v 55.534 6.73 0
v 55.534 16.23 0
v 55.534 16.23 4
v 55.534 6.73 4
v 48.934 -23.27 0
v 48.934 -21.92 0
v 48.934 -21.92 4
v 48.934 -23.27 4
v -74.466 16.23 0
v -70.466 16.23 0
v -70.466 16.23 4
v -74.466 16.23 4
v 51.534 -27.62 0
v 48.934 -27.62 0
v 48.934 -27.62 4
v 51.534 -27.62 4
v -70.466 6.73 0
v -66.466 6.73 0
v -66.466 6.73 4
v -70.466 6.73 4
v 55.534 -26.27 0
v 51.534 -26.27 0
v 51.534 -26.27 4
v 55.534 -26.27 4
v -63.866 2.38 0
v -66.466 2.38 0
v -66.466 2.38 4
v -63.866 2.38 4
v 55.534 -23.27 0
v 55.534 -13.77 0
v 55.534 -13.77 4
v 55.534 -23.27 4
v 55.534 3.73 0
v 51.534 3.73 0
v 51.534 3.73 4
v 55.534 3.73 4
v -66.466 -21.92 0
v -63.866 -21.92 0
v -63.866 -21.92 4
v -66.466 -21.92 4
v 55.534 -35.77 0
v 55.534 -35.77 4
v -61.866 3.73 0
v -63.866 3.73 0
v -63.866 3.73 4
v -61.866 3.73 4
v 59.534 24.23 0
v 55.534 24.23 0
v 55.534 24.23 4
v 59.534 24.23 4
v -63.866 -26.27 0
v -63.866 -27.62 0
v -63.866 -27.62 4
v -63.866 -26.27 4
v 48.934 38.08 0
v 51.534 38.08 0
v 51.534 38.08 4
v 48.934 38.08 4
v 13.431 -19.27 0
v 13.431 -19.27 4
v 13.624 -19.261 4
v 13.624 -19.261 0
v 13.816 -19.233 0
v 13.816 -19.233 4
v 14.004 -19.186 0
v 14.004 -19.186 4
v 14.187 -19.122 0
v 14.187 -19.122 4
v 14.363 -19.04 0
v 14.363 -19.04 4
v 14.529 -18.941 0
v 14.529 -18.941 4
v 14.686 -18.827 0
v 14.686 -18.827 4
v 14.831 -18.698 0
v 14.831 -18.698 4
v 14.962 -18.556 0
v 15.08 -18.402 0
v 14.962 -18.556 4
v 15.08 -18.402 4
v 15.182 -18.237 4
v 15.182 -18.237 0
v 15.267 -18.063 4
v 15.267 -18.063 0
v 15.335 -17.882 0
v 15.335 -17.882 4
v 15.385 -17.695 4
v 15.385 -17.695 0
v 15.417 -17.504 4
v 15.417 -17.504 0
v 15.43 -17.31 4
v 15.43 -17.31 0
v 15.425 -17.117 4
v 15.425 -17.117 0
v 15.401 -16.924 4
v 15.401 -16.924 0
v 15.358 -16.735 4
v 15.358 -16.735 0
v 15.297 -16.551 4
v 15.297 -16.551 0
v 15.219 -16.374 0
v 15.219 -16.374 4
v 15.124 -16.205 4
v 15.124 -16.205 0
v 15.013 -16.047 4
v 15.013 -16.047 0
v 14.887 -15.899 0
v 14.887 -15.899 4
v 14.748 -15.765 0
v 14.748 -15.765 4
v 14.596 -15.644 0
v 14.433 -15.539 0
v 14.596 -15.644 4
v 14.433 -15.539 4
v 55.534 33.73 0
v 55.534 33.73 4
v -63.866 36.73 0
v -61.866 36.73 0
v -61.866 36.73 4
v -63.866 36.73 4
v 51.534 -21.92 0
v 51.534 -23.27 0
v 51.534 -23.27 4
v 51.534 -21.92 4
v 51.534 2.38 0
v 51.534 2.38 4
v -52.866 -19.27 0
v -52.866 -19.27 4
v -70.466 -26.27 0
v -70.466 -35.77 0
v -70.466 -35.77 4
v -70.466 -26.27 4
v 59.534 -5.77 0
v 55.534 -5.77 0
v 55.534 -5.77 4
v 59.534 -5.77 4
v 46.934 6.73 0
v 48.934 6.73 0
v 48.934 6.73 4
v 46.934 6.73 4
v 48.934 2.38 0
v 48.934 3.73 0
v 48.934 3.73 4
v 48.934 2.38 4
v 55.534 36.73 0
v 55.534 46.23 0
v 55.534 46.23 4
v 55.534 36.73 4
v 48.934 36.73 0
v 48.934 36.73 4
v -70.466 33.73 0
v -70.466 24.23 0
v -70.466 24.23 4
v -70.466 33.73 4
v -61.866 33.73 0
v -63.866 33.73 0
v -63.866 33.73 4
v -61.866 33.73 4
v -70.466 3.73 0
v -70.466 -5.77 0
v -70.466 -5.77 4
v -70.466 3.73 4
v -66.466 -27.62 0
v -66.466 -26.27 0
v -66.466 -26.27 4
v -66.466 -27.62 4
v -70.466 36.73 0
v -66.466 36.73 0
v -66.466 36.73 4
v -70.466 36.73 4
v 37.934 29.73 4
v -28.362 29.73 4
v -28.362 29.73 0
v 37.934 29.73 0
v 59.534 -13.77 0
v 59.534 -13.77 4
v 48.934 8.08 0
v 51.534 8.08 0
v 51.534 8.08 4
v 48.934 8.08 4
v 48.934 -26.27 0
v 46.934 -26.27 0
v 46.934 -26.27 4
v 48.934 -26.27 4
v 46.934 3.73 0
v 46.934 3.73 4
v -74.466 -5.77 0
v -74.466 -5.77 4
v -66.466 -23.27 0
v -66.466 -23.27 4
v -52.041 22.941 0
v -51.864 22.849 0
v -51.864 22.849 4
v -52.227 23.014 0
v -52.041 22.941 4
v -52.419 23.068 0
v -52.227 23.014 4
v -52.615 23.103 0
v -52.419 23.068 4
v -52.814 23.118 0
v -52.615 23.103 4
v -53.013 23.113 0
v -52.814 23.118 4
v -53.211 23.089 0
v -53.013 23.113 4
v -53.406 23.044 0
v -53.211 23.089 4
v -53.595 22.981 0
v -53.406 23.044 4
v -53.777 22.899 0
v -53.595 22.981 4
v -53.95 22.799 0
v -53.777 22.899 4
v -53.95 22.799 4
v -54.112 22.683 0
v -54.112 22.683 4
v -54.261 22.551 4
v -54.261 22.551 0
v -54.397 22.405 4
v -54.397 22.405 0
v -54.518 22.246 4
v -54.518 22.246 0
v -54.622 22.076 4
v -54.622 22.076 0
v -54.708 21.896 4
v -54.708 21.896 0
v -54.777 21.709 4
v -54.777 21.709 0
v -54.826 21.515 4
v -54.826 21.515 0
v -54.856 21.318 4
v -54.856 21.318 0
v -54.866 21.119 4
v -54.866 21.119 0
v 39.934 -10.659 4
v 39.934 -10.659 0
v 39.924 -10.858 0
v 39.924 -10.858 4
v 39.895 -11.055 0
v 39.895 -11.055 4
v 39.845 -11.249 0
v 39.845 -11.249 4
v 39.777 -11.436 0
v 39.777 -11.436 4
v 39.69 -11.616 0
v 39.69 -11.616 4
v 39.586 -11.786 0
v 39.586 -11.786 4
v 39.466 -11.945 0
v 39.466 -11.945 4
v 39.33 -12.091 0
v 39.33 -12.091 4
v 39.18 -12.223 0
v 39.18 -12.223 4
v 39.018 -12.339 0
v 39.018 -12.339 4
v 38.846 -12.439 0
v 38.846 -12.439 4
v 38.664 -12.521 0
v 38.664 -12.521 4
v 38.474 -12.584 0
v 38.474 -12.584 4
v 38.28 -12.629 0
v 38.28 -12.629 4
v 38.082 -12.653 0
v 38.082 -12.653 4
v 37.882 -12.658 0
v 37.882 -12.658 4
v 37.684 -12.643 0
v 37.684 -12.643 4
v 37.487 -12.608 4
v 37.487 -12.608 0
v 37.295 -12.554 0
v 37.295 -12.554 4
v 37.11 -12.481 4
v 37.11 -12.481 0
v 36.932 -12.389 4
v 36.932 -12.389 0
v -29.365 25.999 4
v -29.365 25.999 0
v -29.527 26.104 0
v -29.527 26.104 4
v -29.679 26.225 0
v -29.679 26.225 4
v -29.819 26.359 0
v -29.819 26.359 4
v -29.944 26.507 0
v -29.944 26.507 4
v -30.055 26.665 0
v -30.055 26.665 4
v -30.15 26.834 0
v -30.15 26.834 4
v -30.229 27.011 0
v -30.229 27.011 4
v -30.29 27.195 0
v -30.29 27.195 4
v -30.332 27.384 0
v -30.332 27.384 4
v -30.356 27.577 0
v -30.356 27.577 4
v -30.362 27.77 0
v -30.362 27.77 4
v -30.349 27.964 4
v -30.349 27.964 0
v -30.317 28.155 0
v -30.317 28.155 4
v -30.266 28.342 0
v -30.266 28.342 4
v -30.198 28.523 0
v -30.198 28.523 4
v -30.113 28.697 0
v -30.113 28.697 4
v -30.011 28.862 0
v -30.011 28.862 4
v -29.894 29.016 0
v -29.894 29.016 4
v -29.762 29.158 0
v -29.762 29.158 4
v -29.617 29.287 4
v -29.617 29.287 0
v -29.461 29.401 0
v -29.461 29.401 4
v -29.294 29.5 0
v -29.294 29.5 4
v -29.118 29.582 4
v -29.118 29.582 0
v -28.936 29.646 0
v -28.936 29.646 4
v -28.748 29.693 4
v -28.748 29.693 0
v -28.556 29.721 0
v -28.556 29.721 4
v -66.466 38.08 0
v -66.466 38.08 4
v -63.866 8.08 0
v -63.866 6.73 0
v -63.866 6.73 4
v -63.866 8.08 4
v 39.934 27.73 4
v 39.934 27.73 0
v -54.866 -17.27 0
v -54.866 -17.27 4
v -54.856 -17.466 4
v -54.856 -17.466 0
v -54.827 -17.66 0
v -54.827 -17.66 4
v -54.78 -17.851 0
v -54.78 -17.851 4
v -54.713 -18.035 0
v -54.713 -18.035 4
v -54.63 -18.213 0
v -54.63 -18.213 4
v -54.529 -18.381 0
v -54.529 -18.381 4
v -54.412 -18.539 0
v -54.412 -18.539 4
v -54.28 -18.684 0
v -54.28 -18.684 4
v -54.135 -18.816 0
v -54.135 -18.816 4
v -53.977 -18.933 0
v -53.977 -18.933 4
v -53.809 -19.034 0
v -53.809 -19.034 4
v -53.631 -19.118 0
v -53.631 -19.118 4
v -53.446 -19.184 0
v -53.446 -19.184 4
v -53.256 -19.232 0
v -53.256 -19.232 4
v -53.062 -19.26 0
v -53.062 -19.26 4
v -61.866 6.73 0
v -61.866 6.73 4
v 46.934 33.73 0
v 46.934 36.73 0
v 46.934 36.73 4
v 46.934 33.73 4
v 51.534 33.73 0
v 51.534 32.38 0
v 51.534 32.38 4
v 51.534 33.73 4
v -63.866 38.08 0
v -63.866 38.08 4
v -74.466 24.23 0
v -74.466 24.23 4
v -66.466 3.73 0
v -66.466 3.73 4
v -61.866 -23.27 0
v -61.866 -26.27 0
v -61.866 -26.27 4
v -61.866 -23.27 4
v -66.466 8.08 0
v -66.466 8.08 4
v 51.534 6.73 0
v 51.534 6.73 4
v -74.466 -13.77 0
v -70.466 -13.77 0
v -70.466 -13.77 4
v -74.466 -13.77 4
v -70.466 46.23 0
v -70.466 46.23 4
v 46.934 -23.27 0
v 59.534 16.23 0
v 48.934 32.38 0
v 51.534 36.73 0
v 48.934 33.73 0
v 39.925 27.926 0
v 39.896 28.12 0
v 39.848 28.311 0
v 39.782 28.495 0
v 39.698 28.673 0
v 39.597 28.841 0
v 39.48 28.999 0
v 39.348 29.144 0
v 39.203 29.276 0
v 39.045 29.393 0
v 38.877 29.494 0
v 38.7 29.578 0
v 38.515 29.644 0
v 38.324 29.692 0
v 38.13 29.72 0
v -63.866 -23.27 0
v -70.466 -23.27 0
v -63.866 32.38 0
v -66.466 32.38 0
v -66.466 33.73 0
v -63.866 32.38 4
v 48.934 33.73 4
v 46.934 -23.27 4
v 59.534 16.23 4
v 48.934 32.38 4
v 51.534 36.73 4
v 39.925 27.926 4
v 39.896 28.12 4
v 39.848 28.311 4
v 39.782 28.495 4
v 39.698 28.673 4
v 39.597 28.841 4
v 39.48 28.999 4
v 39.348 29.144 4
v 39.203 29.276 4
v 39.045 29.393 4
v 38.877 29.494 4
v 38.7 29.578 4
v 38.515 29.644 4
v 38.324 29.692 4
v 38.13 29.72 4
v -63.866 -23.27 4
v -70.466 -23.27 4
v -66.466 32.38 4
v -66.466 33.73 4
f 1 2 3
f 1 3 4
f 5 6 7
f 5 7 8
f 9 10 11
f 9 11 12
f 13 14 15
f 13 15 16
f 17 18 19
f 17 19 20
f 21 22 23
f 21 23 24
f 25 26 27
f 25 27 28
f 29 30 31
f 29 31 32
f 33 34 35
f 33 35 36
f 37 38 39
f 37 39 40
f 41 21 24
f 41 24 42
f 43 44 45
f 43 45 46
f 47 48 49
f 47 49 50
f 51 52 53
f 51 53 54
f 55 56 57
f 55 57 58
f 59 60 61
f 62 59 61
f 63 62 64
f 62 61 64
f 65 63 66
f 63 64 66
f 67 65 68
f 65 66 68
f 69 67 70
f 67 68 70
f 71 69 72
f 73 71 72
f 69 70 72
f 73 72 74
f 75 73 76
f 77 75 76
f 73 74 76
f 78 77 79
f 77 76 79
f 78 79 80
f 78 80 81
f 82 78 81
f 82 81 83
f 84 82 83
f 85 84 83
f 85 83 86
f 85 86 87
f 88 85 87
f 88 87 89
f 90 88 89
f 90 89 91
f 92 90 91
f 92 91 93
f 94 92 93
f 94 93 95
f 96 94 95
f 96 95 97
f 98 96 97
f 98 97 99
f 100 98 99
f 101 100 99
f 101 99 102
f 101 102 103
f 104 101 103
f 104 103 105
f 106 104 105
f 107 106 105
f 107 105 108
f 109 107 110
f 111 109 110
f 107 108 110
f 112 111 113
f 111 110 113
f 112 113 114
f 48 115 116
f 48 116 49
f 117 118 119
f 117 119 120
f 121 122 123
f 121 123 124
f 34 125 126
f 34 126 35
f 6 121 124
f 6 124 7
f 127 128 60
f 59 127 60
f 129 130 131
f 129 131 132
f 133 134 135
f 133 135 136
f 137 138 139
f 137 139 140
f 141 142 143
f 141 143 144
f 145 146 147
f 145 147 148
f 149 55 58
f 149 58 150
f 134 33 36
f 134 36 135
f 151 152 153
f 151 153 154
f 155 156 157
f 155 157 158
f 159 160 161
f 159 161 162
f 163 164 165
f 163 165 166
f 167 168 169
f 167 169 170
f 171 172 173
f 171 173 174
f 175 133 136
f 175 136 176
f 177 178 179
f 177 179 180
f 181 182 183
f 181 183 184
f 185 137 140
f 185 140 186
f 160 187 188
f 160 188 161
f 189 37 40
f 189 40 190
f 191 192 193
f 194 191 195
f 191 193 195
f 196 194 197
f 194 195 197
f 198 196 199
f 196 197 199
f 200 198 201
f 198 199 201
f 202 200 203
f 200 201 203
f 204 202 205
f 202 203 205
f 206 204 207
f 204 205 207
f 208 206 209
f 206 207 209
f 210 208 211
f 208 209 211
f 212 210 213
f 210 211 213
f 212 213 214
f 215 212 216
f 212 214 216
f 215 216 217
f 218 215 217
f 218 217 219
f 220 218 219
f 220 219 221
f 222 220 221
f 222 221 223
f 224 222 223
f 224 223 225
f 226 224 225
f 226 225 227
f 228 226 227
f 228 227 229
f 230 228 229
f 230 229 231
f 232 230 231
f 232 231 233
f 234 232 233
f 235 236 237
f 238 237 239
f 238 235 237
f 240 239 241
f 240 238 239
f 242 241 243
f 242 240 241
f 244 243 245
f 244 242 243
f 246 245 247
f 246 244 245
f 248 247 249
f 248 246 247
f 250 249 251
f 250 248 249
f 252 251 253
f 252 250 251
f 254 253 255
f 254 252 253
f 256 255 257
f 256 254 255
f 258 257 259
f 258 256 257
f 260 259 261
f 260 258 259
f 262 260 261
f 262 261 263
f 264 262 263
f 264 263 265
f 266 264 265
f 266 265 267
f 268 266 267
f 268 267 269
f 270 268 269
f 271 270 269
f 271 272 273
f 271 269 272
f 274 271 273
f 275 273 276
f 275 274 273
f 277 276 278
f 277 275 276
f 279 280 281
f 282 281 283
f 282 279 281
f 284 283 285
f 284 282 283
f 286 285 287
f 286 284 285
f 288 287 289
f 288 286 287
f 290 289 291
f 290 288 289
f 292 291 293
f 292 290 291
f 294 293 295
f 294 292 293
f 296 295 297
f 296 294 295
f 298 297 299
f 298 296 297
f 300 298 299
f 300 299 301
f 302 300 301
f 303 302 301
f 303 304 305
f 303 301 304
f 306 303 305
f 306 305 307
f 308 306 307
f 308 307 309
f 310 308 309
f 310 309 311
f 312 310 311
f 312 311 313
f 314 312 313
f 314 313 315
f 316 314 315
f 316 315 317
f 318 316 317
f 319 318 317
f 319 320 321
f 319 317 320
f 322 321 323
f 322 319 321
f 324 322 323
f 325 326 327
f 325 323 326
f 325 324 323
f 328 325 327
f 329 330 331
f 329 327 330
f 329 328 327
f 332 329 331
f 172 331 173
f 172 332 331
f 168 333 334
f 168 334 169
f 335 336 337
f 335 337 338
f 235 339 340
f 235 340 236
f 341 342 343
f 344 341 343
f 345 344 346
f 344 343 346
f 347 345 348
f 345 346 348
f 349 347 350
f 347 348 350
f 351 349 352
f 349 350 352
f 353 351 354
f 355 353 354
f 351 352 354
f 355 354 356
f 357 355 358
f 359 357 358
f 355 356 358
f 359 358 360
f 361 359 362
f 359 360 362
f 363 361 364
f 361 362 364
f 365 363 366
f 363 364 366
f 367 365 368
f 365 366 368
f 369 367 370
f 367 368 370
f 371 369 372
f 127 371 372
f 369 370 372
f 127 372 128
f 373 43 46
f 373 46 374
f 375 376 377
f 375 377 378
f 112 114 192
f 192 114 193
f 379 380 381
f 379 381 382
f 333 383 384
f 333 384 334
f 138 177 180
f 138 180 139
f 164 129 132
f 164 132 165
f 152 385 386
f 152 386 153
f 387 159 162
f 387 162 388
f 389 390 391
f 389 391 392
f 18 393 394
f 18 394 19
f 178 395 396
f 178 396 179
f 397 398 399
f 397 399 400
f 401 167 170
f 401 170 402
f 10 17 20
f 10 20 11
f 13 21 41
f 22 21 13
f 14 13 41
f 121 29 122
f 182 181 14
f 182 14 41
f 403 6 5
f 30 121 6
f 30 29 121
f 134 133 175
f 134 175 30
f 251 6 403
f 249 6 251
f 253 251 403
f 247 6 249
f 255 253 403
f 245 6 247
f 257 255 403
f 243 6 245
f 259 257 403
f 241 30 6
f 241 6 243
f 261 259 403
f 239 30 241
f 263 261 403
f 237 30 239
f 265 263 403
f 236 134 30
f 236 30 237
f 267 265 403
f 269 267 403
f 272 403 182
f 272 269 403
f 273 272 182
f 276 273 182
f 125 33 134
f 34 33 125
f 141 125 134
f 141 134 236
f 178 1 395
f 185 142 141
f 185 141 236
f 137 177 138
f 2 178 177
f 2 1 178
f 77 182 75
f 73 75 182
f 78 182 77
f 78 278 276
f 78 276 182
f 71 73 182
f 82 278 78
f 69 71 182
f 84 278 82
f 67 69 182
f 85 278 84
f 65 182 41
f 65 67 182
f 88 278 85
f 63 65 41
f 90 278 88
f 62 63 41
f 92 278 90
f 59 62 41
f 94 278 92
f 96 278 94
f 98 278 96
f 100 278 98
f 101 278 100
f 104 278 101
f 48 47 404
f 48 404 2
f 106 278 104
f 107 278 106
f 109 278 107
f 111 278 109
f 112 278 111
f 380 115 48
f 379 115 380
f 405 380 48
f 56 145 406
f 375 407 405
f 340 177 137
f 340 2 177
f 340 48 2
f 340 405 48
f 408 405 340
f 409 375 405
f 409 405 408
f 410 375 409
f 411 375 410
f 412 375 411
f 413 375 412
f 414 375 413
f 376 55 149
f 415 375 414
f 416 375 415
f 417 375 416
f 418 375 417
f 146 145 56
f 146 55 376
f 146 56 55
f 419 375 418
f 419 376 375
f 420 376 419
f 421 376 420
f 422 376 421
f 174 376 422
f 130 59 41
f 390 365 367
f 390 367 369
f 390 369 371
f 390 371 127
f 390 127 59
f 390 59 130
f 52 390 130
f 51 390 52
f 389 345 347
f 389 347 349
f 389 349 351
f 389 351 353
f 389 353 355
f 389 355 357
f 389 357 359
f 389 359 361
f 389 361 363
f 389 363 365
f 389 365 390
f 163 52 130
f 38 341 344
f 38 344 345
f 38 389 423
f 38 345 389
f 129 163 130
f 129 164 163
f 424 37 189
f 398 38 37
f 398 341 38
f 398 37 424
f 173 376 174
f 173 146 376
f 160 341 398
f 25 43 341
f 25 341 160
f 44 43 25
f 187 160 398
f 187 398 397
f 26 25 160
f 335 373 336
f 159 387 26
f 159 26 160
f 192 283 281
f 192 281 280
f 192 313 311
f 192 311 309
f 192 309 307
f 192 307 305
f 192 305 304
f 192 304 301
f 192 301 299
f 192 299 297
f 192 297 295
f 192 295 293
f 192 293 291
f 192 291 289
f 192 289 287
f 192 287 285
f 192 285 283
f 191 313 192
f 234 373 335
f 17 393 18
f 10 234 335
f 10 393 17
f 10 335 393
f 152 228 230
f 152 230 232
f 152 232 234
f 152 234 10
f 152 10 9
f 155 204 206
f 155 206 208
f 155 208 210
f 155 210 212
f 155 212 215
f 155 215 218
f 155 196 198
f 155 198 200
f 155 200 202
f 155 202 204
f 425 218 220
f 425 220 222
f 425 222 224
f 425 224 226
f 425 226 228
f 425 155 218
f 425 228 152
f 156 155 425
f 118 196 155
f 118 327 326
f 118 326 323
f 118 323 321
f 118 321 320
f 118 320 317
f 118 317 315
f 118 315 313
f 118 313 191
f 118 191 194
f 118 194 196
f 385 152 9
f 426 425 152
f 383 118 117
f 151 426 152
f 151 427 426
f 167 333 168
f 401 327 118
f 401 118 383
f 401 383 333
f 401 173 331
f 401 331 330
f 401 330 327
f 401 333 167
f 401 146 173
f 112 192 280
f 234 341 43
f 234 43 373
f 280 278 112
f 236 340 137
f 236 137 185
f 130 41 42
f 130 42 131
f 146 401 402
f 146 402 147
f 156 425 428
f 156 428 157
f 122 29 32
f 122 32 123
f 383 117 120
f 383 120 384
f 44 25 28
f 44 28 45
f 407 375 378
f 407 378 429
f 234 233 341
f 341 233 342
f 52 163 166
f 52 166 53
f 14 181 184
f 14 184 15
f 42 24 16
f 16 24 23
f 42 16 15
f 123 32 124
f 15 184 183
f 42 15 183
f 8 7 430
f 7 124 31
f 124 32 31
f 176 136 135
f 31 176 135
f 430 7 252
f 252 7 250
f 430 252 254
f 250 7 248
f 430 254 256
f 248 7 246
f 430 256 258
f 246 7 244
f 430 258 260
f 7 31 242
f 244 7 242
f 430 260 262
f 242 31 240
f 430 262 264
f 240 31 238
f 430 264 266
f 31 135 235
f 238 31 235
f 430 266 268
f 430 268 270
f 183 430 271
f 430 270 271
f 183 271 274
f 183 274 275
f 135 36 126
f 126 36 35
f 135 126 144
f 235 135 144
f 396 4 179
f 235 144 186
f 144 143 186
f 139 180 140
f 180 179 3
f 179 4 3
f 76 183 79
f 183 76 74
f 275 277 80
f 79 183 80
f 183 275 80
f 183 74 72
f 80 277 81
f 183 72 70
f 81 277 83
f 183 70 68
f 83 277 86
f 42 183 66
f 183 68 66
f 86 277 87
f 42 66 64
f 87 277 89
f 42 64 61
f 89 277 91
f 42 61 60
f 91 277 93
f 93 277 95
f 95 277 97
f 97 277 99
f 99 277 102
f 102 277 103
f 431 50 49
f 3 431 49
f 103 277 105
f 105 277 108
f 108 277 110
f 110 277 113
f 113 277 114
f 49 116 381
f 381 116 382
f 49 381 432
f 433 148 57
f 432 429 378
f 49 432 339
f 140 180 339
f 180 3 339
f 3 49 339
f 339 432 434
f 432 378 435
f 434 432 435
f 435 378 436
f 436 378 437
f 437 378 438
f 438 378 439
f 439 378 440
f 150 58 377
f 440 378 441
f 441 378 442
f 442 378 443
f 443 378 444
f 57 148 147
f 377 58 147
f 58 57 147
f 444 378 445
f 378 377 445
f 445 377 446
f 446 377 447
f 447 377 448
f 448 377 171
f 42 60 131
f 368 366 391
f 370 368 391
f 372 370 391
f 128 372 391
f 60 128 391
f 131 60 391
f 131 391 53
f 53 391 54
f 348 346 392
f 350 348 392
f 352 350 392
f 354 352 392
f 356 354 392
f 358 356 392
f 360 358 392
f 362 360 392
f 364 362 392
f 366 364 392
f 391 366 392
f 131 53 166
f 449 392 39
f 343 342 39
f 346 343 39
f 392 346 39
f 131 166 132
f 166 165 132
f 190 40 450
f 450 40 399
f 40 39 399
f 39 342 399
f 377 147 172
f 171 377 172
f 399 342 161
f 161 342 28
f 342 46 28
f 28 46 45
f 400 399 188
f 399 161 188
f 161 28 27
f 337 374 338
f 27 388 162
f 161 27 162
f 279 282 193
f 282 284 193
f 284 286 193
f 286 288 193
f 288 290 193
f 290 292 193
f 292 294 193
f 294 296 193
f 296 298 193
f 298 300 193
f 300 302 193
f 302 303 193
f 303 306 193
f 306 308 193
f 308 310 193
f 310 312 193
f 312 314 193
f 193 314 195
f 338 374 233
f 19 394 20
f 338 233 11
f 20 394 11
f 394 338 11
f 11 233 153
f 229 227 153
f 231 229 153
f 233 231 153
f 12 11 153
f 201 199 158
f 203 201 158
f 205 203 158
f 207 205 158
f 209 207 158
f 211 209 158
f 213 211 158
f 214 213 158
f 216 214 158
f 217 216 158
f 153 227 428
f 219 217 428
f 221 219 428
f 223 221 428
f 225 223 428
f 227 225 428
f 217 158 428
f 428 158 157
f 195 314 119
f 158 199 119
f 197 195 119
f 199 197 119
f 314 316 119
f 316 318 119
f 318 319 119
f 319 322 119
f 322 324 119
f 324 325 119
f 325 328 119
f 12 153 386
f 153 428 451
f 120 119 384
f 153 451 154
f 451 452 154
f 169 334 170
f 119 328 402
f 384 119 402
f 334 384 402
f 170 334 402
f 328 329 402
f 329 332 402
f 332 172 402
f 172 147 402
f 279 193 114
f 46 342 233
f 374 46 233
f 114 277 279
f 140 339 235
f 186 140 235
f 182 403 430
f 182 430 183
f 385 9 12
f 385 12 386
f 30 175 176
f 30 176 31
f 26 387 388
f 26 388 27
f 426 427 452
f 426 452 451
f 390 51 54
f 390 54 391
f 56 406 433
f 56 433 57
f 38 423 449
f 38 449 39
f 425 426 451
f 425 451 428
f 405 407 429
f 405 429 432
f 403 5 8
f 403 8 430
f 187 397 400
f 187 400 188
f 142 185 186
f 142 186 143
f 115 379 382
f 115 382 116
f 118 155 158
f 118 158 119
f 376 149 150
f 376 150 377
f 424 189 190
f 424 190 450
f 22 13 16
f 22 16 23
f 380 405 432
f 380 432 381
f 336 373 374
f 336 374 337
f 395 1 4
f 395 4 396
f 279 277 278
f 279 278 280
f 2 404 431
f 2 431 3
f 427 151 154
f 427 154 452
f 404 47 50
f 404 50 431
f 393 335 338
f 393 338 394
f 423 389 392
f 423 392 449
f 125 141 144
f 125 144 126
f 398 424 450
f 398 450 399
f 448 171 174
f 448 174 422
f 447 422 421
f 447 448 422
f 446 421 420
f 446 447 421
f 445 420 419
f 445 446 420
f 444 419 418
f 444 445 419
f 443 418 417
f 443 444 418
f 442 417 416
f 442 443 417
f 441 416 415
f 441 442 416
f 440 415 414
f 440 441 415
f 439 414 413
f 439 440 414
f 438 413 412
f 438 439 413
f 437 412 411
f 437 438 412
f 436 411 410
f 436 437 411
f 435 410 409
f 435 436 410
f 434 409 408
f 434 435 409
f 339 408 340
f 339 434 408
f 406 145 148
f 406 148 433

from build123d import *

# Parameters (mm, degrees)
EXTRUDE_1_DEPTH     = 4
CUT_EXTRUDE_1_DEPTH = 10


with BuildPart() as part:
    # 草图1 → 凸台-拉伸1 (new body)
    with BuildSketch(Plane.XY):
        Polygon((55.534285714, 24.23), (59.534285714, 24.23), (59.534285714, 16.23), (55.534285714, 16.23), (55.534285714, 6.73), (51.534285714, 6.73), (51.534285714, 8.08), (48.934285714, 8.08), (48.934285714, 6.73), (46.934285714, 6.73), (46.934285714, 3.73), (48.934285714, 3.73), (48.934285714, 2.38), (51.534285714, 2.38), (51.534285714, 3.73), (55.534285714, 3.73), (55.534285714, -5.77), (59.534285714, -5.77), (59.534285714, -13.77), (55.534285714, -13.77), (55.534285714, -23.27), (51.534285714, -23.27), (51.534285714, -21.92), (48.934285714, -21.92), (48.934285714, -23.27), (46.934285714, -23.27), (46.934285714, -26.27), (48.934285714, -26.27), (48.934285714, -27.62), (51.534285714, -27.62), (51.534285714, -26.27), (55.534285714, -26.27), (55.534285714, -35.77), (-70.465714286, -35.77), (-70.465714286, -26.27), (-66.465714286, -26.27), (-66.465714286, -27.62), (-63.865714286, -27.62), (-63.865714286, -26.27), (-61.865714286, -26.27), (-61.865714286, -23.27), (-63.865714286, -23.27), (-63.865714286, -21.92), (-66.465714286, -21.92), (-66.465714286, -23.27), (-70.465714286, -23.27), (-70.465714286, -13.77), (-74.465714286, -13.77), (-74.465714286, -5.77), (-70.465714286, -5.77), (-70.465714286, 3.73), (-66.465714286, 3.73), (-66.465714286, 2.38), (-63.865714286, 2.38), (-63.865714286, 3.73), (-61.865714286, 3.73), (-61.865714286, 6.73), (-63.865714286, 6.73), (-63.865714286, 8.08), (-66.465714286, 8.08), (-66.465714286, 6.73), (-70.465714286, 6.73), (-70.465714286, 16.23), (-74.465714286, 16.23), (-74.465714286, 24.23), (-70.465714286, 24.23), (-70.465714286, 33.73), (-66.465714286, 33.73), (-66.465714286, 32.38), (-63.865714286, 32.38), (-63.865714286, 33.73), (-61.865714286, 33.73), (-61.865714286, 36.73), (-63.865714286, 36.73), (-63.865714286, 38.08), (-66.465714286, 38.08), (-66.465714286, 36.73), (-70.465714286, 36.73), (-70.465714286, 46.23), (55.534285714, 46.23), (55.534285714, 36.73), (51.534285714, 36.73), (51.534285714, 38.08), (48.934285714, 38.08), (48.934285714, 36.73), (46.934285714, 36.73), (46.934285714, 33.73), (48.934285714, 33.73), (48.934285714, 32.38), (51.534285714, 32.38), (51.534285714, 33.73), (55.534285714, 33.73), align=None)
    extrude(amount=EXTRUDE_1_DEPTH)

    # 草图3 → 切除-拉伸1 (cut)
    with BuildSketch(Plane.XY.offset(4)):
        with BuildLine():
            Line((14.43310292, -15.539220042), (-51.863516332, 22.849447356))
            ThreePointArc((-51.863516332, 22.849447356), (-53.864614704, 22.851352584), (-54.865714286, 21.118667398))
            Line((-54.865714286, 21.118667398), (-54.865714286, -17.27))
            ThreePointArc((-54.865714286, -17.27), (-54.279927848, -18.684213562), (-52.865714286, -19.27))
            Line((-52.865714286, -19.27), (13.430904966, -19.27))
            ThreePointArc((13.430904966, -19.27), (15.362427671, -17.788864185), (14.43310292, -15.539220042))
        make_face()
        with BuildLine():
            Line((-28.362333538, 29.73), (37.934285714, 29.73))
            ThreePointArc((37.934285714, 29.73), (39.348499277, 29.144213562), (39.934285714, 27.73))
            Line((39.934285714, 27.73), (39.934285714, -10.658667398))
            ThreePointArc((39.934285714, -10.658667398), (38.933186133, -12.391352584), (36.932087761, -12.389447356))
            Line((36.932087761, -12.389447356), (-29.364531491, 25.999220042))
            ThreePointArc((-29.364531491, 25.999220042), (-30.293856242, 28.248864185), (-28.362333538, 29.73))
        make_face()
    extrude(amount=-CUT_EXTRUDE_1_DEPTH, mode=Mode.SUBTRACT)


solid = part.part
